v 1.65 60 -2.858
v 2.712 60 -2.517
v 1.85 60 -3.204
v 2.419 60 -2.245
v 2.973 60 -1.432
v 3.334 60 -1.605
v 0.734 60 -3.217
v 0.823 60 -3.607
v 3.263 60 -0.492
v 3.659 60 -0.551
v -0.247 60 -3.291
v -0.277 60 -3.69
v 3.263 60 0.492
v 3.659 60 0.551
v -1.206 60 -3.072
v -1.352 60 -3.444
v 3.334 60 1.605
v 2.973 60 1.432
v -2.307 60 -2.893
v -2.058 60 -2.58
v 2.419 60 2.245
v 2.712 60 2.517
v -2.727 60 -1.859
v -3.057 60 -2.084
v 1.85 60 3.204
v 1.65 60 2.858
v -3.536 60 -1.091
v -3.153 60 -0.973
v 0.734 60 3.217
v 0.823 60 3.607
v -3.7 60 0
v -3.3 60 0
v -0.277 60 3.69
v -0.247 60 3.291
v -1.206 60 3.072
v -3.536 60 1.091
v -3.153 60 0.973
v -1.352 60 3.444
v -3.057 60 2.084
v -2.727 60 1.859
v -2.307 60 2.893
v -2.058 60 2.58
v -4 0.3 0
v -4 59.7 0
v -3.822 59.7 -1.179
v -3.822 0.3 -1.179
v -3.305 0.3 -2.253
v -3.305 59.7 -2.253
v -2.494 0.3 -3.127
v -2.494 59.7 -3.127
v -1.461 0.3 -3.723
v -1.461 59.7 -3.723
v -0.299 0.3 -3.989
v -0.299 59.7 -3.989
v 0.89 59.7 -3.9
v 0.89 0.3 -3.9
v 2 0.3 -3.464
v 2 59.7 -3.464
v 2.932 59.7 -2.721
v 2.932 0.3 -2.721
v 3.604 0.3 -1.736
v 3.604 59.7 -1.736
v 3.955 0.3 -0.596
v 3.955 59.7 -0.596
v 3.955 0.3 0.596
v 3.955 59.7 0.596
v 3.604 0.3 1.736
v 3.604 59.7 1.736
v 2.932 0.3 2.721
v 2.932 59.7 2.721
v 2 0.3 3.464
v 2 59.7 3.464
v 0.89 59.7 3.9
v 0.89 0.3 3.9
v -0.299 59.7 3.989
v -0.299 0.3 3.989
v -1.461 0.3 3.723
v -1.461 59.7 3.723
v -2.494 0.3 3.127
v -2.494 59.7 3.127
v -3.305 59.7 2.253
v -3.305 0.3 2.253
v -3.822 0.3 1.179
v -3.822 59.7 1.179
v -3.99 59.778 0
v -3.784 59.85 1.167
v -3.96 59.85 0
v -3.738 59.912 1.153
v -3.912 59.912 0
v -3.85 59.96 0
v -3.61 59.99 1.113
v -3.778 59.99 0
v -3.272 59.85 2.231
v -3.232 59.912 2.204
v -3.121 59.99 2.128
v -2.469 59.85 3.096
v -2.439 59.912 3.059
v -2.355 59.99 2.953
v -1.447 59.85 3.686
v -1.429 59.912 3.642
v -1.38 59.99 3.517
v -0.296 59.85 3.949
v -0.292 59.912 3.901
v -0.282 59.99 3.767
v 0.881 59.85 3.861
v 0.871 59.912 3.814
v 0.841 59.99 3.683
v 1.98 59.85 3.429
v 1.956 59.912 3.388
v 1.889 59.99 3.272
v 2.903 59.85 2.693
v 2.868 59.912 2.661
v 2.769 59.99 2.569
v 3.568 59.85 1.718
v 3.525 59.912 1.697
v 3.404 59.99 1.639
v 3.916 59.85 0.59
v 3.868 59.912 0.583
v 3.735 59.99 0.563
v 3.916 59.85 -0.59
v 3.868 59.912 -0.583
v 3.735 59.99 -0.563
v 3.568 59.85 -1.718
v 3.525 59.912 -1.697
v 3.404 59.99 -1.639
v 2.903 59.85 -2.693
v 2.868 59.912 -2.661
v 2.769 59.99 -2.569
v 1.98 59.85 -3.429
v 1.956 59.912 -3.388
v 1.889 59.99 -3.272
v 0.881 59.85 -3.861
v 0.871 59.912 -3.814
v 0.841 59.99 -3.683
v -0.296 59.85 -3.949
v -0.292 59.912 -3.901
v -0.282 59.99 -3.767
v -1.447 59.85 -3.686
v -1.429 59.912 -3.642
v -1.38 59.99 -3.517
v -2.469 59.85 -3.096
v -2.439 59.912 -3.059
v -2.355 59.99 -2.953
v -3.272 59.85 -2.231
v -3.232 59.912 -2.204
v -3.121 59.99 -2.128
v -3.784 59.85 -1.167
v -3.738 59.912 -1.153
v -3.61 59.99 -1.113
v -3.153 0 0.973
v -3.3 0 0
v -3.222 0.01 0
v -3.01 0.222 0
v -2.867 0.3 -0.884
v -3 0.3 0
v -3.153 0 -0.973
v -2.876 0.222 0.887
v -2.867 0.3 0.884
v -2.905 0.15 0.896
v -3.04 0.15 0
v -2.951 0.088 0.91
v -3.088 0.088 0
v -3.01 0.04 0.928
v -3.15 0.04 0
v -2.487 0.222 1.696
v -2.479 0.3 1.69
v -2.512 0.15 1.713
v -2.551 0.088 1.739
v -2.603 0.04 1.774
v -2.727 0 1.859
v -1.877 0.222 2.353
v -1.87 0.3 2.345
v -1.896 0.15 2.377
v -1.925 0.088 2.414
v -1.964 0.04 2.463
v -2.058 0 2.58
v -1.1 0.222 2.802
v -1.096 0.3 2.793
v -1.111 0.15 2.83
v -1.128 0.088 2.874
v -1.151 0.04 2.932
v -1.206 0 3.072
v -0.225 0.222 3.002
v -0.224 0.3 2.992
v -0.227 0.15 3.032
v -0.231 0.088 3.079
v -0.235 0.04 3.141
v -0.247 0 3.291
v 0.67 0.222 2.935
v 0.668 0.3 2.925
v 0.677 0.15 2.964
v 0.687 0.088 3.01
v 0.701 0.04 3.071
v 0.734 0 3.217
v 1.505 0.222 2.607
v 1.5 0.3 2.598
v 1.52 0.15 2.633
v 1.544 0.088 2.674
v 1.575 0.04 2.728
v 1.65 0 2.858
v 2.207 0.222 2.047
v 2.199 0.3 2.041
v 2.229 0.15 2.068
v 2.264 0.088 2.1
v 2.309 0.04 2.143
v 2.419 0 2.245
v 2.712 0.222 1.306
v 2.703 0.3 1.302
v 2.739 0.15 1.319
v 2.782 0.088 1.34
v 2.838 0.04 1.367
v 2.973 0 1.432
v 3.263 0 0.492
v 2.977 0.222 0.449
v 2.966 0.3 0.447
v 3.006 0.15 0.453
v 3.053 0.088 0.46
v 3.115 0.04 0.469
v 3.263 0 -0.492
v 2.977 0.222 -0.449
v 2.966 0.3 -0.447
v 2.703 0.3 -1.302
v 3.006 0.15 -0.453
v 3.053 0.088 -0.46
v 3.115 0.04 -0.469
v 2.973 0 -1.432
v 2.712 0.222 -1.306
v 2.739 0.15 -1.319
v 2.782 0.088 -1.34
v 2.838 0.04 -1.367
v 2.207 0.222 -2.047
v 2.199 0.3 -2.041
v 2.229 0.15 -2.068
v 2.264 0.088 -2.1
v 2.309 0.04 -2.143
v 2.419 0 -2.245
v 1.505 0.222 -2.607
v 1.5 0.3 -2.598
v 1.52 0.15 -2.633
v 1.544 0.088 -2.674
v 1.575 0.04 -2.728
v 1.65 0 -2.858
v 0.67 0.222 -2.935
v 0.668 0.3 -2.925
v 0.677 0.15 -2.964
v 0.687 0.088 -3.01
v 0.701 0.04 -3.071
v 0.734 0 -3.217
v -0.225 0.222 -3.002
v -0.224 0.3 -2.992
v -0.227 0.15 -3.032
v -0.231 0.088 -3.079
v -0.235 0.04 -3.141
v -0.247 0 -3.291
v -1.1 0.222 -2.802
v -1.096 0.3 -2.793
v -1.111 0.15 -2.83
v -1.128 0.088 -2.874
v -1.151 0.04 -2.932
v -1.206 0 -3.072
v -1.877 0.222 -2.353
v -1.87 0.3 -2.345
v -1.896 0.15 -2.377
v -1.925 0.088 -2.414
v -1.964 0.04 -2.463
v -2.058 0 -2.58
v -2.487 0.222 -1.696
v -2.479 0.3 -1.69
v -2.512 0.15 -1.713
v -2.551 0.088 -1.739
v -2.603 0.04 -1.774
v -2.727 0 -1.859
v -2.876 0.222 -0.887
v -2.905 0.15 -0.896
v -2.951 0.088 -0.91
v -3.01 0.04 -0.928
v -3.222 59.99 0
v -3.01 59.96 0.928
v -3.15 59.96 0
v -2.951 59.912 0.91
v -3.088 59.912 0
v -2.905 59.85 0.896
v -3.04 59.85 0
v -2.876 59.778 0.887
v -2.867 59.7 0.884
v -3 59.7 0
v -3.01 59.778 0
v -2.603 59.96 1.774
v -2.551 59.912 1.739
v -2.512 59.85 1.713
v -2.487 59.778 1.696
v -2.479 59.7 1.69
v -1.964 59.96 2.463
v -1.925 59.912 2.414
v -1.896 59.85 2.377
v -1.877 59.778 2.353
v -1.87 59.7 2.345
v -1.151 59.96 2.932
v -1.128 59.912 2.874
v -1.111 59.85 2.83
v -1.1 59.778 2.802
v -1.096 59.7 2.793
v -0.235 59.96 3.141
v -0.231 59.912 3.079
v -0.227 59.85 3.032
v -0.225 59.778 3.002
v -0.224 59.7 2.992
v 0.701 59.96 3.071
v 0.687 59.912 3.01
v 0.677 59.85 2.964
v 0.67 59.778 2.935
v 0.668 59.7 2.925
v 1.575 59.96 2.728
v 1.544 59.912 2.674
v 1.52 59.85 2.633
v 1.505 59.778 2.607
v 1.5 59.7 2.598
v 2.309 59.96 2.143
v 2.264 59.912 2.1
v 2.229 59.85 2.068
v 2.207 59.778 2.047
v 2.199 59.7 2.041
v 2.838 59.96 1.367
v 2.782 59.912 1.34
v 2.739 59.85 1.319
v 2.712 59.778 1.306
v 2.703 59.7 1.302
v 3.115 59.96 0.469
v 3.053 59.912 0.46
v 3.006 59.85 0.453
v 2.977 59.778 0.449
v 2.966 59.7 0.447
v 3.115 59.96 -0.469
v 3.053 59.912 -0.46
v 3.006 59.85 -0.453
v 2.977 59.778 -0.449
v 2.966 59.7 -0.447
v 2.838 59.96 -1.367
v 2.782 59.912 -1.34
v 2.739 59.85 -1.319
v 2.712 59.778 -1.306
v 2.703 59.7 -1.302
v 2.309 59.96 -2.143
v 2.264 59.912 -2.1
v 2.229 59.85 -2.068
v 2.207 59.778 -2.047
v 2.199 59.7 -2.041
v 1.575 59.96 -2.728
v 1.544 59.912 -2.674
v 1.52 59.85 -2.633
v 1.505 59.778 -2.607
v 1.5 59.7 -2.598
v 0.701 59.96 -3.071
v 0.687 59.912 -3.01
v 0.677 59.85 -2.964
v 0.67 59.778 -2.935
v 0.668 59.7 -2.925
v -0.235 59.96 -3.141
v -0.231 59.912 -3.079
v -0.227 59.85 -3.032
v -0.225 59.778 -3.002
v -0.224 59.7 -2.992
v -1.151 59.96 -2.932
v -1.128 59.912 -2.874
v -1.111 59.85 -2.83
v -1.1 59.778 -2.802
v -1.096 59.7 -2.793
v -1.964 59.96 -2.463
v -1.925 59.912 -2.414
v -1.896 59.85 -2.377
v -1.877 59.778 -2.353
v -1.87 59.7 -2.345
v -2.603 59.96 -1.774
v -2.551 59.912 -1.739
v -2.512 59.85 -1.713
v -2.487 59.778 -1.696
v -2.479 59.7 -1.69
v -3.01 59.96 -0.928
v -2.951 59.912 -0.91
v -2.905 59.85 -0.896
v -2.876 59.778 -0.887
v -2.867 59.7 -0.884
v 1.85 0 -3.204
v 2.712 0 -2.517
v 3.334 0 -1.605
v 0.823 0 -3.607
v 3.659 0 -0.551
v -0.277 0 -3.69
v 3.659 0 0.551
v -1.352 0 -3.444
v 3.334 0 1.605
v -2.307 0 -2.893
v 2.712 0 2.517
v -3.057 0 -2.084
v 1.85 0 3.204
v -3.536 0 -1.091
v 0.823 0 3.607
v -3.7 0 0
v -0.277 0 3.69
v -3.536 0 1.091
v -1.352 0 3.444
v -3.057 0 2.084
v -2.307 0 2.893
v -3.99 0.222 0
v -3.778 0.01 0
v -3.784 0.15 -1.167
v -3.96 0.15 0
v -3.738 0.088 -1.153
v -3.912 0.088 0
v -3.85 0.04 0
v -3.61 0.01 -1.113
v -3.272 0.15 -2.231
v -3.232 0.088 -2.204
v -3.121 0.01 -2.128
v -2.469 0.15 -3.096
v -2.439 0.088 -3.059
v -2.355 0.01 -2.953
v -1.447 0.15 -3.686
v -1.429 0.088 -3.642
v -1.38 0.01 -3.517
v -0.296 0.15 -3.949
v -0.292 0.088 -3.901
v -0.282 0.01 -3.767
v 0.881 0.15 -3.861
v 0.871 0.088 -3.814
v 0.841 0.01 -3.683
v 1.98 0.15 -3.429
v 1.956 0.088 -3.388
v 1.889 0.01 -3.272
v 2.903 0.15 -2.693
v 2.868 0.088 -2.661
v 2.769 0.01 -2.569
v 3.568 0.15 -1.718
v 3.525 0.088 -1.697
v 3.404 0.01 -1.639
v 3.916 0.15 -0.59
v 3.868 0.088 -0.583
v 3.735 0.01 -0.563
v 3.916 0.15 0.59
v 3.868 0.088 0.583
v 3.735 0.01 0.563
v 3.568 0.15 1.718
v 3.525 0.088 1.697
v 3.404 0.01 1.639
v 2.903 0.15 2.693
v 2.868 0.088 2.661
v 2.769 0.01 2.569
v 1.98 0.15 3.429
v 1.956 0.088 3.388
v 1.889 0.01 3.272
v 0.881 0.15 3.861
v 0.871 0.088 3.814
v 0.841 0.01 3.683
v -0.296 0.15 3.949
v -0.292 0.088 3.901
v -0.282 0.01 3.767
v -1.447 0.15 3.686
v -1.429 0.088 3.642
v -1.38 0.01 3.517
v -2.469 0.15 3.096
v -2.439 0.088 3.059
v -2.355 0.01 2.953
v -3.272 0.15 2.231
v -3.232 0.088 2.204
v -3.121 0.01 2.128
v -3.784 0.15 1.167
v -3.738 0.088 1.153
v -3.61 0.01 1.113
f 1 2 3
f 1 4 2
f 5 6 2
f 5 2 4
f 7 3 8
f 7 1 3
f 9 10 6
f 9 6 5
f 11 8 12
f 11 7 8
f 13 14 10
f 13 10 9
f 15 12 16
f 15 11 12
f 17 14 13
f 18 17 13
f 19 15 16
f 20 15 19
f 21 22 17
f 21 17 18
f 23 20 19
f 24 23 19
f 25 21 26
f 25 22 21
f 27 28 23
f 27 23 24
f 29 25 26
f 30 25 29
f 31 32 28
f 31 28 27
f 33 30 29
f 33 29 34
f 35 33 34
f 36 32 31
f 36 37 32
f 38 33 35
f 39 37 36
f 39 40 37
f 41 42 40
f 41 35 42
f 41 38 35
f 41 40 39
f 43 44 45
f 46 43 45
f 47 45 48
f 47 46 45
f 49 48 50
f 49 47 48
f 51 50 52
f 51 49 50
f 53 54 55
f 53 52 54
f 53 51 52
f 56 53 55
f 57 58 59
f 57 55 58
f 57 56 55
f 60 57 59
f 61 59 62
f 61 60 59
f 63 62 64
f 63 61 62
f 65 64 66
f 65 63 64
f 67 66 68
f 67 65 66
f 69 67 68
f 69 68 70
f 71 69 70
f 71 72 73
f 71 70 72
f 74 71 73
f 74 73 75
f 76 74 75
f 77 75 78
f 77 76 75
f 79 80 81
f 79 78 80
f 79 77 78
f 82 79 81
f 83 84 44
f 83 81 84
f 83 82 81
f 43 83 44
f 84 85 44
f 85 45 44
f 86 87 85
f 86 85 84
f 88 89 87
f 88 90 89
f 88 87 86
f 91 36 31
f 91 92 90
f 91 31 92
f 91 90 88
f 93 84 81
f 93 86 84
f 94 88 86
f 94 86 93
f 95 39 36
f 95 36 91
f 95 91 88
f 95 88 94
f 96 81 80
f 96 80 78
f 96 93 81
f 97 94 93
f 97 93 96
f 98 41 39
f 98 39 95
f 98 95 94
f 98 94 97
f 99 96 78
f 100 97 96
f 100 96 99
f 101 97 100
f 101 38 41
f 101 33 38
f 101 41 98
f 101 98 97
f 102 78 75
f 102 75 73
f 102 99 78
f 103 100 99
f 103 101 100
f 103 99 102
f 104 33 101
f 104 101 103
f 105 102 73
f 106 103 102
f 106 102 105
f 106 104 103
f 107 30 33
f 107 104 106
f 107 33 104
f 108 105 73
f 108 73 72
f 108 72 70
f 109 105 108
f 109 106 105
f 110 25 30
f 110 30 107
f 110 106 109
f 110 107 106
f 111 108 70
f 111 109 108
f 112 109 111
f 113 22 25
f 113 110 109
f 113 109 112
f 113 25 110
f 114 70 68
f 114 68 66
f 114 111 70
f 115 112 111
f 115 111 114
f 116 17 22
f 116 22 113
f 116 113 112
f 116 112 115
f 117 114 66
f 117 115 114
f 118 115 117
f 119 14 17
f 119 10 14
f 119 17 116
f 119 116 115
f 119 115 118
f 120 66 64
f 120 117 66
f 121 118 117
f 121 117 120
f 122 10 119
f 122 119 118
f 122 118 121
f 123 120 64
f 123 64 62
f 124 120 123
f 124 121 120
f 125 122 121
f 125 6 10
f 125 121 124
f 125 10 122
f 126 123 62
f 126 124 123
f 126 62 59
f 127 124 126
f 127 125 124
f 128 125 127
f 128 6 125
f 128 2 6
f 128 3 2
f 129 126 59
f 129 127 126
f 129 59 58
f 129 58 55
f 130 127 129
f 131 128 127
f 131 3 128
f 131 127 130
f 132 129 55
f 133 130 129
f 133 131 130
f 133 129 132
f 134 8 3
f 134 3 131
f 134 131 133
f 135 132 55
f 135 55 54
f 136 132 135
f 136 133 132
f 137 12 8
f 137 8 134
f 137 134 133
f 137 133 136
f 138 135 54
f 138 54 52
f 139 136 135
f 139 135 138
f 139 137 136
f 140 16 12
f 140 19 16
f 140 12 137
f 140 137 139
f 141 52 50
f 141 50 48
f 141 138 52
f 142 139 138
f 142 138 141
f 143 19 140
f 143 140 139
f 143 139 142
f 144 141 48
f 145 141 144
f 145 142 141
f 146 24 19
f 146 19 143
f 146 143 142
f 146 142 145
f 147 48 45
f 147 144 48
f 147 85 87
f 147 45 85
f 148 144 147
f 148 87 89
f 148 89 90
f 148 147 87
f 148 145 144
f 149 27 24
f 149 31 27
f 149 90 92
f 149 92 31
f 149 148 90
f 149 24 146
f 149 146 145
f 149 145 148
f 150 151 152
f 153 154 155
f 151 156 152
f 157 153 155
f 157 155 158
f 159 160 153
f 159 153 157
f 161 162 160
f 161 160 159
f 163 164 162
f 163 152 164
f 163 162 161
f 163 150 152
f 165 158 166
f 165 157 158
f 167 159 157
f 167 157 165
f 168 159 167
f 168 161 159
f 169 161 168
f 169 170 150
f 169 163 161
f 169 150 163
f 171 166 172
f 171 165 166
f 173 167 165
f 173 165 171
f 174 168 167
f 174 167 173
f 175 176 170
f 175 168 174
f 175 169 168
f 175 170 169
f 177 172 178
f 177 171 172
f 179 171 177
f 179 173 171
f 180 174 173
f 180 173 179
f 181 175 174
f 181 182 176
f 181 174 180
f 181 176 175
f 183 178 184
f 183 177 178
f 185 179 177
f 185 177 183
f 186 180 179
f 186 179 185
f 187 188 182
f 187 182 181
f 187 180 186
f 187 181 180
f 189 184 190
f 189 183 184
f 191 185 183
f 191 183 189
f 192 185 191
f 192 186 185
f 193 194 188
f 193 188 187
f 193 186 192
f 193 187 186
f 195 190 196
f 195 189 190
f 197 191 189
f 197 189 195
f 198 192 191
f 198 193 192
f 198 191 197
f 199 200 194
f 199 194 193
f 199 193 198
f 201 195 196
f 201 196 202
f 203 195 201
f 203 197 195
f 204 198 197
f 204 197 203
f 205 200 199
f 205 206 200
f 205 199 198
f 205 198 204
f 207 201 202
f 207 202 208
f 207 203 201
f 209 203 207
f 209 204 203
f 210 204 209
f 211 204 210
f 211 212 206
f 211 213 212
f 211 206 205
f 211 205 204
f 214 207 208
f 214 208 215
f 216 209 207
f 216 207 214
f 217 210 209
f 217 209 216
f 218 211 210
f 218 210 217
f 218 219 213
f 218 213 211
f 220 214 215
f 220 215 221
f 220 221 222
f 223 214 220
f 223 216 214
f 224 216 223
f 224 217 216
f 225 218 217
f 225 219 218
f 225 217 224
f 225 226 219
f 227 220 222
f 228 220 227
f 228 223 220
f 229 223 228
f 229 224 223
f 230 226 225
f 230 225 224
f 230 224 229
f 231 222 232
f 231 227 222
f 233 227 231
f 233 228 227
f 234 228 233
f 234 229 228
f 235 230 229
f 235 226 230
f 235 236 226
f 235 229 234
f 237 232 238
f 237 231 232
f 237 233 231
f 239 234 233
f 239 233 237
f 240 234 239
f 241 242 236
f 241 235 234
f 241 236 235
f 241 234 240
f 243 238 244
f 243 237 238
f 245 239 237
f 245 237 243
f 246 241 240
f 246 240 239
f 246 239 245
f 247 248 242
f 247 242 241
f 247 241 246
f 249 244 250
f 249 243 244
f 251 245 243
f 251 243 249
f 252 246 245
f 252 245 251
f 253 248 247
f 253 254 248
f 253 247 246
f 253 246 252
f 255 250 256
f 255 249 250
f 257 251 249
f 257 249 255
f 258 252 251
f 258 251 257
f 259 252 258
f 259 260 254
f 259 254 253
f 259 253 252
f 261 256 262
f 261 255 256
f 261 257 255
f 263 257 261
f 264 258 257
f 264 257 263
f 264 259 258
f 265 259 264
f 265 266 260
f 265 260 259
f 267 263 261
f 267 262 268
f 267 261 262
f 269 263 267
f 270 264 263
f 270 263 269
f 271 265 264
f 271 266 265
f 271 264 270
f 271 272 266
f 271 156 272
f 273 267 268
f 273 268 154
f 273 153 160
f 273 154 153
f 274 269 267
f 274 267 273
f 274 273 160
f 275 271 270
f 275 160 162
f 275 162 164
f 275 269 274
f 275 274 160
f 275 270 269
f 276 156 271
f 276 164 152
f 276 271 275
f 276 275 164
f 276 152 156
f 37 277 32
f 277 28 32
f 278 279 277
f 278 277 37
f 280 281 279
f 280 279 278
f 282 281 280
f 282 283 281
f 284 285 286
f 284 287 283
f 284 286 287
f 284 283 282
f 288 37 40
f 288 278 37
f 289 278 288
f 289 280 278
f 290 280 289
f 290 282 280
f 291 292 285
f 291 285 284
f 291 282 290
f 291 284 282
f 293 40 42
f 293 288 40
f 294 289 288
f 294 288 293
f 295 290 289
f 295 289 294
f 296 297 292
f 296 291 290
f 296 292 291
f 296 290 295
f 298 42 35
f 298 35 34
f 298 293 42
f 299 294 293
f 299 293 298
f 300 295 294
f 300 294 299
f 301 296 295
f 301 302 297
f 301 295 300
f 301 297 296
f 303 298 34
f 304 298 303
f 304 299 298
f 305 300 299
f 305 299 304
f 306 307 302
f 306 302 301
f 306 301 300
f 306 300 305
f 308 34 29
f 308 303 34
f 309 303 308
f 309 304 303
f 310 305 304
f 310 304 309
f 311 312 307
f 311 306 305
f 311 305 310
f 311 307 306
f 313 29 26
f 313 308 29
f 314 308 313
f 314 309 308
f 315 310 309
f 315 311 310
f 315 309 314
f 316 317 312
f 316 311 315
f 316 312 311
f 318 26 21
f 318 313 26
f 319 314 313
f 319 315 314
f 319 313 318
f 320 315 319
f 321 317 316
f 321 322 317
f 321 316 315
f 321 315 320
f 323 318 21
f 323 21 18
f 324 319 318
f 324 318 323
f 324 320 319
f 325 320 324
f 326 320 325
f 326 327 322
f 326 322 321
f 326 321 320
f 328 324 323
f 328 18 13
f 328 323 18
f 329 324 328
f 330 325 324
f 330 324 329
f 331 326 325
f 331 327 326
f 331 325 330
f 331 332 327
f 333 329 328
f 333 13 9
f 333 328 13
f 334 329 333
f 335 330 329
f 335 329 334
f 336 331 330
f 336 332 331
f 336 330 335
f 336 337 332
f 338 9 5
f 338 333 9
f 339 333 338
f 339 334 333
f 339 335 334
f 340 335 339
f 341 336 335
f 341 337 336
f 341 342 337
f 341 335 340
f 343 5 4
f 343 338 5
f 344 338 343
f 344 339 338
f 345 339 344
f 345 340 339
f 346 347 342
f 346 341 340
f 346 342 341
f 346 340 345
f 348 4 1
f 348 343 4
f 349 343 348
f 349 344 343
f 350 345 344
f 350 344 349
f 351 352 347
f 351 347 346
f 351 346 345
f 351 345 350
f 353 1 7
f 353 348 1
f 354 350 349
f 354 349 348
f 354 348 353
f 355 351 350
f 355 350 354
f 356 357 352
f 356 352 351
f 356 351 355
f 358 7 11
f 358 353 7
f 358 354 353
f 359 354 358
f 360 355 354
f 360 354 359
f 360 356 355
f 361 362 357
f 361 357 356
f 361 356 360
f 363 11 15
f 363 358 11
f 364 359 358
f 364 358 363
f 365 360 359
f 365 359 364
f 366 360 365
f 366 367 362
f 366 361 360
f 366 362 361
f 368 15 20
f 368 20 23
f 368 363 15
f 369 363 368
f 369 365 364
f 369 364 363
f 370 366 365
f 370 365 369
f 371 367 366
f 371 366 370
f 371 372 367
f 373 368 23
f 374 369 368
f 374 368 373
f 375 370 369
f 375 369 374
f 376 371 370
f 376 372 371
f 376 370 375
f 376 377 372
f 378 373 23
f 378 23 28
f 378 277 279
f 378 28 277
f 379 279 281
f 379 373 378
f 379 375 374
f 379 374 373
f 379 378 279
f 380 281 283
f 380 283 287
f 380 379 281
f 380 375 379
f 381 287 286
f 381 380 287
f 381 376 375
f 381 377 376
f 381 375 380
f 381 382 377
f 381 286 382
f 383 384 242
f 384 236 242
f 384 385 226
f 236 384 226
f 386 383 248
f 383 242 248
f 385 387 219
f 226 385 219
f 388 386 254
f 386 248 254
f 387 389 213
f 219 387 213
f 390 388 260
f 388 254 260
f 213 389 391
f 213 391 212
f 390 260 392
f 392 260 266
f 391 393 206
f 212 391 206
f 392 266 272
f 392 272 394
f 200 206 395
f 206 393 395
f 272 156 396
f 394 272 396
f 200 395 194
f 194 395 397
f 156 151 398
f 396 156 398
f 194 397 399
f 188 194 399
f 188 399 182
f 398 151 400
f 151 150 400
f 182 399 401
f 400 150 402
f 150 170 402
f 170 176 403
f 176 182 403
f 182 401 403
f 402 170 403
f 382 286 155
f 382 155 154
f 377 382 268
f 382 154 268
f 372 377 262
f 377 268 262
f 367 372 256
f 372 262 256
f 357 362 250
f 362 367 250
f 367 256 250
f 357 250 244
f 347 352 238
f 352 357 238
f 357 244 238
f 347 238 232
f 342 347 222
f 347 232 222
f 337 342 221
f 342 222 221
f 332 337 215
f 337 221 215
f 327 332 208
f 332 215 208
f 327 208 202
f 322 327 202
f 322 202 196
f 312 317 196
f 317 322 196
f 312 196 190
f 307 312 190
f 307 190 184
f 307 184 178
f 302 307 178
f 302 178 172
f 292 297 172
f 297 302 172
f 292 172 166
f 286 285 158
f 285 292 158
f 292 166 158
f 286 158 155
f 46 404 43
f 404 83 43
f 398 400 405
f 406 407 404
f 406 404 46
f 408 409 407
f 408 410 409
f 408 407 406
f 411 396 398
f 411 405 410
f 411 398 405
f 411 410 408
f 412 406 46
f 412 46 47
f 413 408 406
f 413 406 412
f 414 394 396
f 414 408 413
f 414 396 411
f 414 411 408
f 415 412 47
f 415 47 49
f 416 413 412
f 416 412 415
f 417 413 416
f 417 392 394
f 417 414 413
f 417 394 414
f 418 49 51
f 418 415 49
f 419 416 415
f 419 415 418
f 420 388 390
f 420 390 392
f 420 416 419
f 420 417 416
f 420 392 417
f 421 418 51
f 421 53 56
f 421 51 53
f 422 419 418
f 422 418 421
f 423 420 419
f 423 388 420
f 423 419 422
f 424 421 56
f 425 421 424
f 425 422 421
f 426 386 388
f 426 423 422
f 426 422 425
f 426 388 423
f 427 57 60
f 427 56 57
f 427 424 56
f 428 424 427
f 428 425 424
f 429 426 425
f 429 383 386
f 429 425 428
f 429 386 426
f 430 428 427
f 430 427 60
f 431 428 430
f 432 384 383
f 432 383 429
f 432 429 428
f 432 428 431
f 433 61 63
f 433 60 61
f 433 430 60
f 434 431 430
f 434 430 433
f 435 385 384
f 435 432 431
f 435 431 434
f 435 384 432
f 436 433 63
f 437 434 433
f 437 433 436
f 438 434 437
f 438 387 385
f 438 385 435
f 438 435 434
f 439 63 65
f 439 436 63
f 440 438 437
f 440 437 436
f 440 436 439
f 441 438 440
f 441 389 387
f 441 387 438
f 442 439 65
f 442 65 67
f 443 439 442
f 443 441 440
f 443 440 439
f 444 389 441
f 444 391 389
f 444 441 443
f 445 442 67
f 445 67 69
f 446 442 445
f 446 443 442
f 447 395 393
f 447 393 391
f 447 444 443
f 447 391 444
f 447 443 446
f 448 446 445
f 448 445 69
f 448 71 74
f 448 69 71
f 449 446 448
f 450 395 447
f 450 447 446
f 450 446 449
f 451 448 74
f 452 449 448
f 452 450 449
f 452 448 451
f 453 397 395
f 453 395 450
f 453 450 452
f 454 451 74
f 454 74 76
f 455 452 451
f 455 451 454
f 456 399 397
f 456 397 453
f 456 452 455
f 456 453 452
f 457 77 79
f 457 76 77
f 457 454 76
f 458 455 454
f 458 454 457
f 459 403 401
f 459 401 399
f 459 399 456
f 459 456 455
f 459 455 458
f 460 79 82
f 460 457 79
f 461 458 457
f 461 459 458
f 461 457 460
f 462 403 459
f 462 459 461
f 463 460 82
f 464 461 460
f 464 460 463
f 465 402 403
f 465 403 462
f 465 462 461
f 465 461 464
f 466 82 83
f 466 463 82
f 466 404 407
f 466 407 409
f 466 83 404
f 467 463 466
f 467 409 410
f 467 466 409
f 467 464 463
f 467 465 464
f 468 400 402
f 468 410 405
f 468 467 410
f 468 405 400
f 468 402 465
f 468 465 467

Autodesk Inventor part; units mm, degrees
ref_plane "YZ Plane" through (0, 0, 0) normal (1, 0, 0) x (0, 1, 0)
ref_plane "XZ Plane" through (0, 0, 0) normal (0, 1, 0) x (-1, 0, 0)
ref_plane "XY Plane" through (0, 0, 0) normal (0, 0, 1) x (1, 0, 0)
sketch "Sketch3" plane through (0, 0, 0) normal (0, 1, 0) x (-1, 0, 0)
  circle A0 centre (0, 0) radius 4
  circle A1 centre (0, 0) radius 3
  dimension "d4" = 8
  dimension "d6" = 6
extrude "Extrusion2" add sketch "Sketch3" along normal blind 60
fillet "Fillet1" radius 0.3 2 edges at (4, 0, 0) (3, 0, 0)
fillet "Fillet2" radius 0.3 1 edges at (4, 60, 0)
fillet "Fillet3" radius 0.3 1 edges at (3, 60, 0)
properties part number "tube" material "Glass"
